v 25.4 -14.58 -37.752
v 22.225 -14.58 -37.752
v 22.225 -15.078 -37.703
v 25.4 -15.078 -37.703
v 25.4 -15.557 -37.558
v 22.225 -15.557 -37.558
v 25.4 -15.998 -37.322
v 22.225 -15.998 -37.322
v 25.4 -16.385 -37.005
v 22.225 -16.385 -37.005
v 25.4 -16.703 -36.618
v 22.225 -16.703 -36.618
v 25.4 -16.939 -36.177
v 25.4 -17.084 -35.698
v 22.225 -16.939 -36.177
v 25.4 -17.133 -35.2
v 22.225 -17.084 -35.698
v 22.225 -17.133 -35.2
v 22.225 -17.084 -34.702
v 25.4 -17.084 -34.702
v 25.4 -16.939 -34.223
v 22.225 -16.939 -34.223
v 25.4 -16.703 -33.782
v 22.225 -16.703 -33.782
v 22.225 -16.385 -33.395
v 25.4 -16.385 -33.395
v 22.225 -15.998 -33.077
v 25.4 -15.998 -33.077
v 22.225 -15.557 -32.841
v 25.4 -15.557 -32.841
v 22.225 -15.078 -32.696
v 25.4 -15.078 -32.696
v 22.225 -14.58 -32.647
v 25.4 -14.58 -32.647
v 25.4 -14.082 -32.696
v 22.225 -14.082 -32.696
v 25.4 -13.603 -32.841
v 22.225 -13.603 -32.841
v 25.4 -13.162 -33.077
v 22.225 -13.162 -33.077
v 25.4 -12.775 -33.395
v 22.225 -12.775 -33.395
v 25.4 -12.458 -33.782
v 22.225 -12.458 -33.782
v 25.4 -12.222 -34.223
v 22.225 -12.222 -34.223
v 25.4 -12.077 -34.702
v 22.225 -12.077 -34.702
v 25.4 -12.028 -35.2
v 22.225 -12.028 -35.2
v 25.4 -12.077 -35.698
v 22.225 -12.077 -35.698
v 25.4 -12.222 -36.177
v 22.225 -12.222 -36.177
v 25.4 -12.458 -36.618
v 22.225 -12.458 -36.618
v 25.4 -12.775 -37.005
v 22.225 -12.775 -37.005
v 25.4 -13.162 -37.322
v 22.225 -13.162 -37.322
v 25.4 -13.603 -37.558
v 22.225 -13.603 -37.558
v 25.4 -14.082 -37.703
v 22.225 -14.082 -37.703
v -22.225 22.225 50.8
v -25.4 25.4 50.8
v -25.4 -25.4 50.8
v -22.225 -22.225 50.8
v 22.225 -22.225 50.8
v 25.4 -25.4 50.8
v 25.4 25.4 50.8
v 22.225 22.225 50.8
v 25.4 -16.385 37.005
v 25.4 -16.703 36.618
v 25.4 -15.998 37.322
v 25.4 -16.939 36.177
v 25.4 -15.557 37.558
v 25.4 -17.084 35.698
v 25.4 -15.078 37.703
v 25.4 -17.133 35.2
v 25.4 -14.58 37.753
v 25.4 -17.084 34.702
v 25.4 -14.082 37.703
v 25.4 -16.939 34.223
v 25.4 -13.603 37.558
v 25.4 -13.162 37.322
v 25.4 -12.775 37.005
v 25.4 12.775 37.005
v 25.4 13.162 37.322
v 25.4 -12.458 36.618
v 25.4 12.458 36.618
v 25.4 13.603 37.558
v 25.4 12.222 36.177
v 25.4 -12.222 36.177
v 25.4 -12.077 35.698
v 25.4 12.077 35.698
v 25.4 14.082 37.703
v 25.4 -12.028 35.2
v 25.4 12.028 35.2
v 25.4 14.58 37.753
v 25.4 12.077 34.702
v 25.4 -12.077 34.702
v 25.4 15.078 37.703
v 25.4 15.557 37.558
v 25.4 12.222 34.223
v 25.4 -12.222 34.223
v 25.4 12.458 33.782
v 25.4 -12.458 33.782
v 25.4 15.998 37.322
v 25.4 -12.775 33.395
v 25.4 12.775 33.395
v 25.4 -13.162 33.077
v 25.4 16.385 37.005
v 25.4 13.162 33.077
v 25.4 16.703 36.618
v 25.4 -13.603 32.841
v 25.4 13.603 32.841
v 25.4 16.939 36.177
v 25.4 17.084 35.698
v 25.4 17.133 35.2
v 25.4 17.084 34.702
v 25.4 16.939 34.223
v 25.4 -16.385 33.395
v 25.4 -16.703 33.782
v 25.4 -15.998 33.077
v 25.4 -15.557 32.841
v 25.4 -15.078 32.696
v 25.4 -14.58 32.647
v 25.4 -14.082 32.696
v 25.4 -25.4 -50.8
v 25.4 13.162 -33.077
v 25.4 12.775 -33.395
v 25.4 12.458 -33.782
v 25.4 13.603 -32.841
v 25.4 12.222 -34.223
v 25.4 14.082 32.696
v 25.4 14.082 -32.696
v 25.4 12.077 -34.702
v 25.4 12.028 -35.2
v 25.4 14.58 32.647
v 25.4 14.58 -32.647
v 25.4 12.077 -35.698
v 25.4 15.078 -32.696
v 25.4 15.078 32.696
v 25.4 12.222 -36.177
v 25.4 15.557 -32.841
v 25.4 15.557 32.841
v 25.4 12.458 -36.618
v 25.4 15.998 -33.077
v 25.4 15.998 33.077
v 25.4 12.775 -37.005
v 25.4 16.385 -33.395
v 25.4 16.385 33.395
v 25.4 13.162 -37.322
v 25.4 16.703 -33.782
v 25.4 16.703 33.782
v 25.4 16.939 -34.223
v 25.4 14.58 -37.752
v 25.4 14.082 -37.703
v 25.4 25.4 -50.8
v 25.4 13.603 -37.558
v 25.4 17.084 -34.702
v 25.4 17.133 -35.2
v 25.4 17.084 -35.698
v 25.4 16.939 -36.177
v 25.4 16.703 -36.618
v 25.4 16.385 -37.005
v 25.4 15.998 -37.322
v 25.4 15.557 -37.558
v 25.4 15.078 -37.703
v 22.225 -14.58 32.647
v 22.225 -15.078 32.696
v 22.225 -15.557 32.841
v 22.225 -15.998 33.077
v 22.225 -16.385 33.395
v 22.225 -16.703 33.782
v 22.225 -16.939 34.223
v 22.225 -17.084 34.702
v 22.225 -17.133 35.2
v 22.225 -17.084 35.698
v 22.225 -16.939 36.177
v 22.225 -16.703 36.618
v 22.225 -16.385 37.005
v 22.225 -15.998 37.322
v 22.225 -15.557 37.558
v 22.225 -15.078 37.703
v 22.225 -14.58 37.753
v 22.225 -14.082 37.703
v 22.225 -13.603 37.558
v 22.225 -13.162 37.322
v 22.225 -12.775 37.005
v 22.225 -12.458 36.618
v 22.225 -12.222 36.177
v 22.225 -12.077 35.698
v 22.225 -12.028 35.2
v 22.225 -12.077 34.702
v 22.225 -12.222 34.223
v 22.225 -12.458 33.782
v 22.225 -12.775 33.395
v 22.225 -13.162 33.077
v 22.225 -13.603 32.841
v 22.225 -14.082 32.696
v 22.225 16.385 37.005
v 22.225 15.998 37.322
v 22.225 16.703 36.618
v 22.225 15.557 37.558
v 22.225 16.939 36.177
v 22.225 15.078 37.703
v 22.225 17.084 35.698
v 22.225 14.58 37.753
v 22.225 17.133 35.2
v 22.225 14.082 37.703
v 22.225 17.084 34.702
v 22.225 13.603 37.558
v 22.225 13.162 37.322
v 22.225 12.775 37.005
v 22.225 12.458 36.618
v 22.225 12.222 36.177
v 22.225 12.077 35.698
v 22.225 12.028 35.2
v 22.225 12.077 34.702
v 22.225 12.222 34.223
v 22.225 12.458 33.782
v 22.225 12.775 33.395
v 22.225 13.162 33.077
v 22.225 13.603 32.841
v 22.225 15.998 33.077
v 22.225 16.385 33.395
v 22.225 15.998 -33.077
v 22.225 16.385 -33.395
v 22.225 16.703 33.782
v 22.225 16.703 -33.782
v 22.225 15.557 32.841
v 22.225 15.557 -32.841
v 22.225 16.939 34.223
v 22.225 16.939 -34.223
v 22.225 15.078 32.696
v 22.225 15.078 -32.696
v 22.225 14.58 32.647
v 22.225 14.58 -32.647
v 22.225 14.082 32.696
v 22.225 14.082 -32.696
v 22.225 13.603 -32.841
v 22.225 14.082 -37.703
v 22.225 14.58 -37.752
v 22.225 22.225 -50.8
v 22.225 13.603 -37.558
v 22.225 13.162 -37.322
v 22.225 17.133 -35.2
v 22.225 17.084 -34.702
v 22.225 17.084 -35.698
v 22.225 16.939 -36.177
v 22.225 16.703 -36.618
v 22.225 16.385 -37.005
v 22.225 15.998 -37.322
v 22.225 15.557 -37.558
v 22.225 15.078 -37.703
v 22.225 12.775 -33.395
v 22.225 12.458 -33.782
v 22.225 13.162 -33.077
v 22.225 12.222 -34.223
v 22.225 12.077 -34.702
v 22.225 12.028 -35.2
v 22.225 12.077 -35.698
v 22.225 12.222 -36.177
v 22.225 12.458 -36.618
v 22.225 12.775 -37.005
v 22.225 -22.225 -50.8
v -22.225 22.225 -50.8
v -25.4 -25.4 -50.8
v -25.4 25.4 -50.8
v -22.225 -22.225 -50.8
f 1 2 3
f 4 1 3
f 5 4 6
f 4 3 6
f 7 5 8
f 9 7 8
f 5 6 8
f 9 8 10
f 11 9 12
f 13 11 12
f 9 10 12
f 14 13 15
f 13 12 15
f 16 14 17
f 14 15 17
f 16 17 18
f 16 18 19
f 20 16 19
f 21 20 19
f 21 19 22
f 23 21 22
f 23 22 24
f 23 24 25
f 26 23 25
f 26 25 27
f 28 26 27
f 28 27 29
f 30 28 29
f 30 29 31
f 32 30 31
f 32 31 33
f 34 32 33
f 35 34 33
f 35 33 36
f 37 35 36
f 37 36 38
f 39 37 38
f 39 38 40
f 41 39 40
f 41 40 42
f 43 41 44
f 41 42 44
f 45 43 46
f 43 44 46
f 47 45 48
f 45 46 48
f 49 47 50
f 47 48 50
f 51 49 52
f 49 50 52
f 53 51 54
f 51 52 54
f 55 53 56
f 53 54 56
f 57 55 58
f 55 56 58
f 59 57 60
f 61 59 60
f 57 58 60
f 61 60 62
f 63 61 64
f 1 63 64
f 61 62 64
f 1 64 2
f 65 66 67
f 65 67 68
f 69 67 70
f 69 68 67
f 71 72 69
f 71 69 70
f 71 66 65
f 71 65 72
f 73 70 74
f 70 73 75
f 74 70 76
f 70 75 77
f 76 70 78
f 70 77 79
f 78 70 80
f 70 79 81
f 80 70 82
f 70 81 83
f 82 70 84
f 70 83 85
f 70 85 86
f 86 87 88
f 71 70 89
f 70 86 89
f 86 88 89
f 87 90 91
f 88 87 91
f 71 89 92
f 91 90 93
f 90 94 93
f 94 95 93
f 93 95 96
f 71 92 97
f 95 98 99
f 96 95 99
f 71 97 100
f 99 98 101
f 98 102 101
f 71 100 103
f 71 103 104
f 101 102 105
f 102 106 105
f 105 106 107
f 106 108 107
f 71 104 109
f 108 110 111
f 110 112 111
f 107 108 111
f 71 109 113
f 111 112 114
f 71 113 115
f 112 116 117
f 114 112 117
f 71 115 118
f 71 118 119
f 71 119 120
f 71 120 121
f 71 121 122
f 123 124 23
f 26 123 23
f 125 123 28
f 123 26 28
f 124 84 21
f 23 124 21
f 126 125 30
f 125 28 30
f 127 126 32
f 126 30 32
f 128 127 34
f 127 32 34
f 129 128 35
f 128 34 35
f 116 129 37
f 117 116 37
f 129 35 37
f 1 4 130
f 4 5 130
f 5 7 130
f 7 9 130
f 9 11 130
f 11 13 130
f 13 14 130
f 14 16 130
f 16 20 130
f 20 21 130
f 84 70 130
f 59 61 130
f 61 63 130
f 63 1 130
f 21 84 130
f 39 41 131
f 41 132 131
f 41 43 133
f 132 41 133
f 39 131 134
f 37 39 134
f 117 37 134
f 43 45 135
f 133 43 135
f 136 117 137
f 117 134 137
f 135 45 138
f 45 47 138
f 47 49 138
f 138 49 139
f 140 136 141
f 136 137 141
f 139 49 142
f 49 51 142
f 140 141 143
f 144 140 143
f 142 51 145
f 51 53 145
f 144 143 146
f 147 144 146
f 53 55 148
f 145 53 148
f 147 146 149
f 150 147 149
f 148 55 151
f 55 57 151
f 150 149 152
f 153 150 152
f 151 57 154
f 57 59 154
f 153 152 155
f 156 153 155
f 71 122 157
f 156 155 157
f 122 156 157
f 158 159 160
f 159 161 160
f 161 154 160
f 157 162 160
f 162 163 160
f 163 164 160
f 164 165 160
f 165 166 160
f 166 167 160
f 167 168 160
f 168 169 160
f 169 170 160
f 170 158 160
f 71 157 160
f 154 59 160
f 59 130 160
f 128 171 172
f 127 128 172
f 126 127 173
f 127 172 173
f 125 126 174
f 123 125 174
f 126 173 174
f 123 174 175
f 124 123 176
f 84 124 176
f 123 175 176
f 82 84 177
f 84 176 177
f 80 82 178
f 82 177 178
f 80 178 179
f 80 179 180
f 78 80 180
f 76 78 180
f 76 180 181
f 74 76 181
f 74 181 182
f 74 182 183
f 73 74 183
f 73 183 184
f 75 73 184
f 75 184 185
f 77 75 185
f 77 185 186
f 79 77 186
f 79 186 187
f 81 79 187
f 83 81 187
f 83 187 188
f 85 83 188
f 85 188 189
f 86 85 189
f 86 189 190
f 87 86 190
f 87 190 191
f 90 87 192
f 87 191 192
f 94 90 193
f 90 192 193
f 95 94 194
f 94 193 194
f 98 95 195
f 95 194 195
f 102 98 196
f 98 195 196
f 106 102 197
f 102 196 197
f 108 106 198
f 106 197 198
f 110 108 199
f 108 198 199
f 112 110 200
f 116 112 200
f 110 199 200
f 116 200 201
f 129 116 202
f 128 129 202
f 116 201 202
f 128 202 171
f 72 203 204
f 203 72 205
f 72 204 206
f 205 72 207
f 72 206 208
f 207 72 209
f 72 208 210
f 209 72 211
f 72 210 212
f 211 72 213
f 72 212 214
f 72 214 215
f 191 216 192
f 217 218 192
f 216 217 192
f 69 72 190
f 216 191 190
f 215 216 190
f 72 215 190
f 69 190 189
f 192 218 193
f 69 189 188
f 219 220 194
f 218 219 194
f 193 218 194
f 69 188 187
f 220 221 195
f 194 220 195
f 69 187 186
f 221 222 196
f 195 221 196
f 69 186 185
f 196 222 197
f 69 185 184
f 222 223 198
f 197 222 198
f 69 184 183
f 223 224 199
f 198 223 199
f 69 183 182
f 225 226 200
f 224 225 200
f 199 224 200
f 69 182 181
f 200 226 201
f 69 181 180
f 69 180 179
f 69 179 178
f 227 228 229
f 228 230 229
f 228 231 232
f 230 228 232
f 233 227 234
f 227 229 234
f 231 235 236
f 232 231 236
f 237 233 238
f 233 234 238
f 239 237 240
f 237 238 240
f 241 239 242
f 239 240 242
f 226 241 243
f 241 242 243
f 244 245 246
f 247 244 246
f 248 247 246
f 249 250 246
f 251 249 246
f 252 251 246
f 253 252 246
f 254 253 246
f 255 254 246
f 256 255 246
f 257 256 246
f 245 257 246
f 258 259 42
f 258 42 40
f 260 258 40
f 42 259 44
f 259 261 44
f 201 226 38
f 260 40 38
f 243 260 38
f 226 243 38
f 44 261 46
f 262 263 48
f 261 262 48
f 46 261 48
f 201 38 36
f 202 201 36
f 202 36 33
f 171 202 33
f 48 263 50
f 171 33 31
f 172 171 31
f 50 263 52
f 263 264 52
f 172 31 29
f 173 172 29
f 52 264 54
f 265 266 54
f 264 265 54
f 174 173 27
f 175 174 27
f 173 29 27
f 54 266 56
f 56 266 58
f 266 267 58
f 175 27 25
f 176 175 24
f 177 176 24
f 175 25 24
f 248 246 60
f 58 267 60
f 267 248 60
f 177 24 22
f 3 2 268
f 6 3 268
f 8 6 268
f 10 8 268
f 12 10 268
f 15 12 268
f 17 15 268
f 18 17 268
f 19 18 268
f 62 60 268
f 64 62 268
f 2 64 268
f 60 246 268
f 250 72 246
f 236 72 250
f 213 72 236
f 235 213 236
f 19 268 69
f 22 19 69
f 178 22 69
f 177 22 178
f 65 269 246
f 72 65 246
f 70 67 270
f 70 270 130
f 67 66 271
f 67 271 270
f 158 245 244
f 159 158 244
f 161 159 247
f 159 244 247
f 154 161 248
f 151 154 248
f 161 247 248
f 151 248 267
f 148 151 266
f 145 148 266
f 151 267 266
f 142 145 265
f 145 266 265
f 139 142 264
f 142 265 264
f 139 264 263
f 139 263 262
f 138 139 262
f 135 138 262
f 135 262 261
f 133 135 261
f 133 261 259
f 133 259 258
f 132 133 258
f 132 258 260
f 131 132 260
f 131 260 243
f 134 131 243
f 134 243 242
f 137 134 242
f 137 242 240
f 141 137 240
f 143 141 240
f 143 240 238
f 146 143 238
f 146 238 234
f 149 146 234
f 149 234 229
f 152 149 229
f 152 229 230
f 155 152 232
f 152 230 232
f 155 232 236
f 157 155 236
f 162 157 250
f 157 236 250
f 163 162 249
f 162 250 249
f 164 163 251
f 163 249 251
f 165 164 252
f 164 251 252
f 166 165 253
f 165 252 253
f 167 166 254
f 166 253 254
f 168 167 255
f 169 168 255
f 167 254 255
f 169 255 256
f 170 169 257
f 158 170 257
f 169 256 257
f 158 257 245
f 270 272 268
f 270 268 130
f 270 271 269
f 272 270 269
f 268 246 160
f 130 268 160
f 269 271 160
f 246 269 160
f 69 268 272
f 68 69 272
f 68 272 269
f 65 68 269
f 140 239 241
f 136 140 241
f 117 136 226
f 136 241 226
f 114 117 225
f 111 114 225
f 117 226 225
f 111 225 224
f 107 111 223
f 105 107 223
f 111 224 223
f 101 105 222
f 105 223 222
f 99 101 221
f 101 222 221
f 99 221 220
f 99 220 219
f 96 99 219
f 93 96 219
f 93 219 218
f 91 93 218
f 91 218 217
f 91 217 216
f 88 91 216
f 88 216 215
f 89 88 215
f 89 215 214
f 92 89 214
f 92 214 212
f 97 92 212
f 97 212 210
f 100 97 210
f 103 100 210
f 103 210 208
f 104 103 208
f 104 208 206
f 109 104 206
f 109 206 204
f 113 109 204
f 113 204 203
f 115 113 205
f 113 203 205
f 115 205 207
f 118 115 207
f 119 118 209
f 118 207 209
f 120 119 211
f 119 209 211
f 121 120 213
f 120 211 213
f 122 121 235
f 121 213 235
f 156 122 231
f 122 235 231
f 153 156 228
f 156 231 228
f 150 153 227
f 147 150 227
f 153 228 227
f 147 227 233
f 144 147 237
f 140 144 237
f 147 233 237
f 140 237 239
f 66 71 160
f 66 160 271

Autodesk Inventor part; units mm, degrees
ref_plane "YZ Plane" through (0, 0, 0) normal (1, 0, 0) x (0, 1, 0)
ref_plane "XZ Plane" through (0, 0, 0) normal (0, 1, 0) x (-1, 0, 0)
ref_plane "XY Plane" through (0, 0, 0) normal (0, 0, 1) x (1, 0, 0)
sketch "Sketch1" plane through (0, 0, 0) normal (0, 0, 1) x (1, 0, 0)
  line L0 (-25.4, -25.4) -> (25.4, -25.4)
  line L1 (25.4, -25.4) -> (25.4, 25.4)
  line L2 (25.4, 25.4) -> (-25.4, 25.4)
  line L3 (-25.4, 25.4) -> (-25.4, -25.4)
  line L4 (-25.4, -25.4) -> (25.4, 25.4) construction
  line L5 (25.4, -25.4) -> (-25.4, 25.4) construction
  line L6 (-22.225, 22.225) -> (22.225, 22.225)
  line L7 (22.225, 22.225) -> (22.225, -22.225)
  line L8 (22.225, -22.225) -> (-22.225, -22.225)
  line L9 (-22.225, -22.225) -> (-22.225, 22.225)
  point P0 (0, 0)
  dimension "width" = 50.8
  dimension "height" = 50.8
  dimension "thickness" = 3.175
extrude "Extrusion1" add sketch "Sketch1" along normal mid plane 101.6
sketch "Sketch2" plane through (25.4, -25.4, 50.8) normal (1, 0, 0) x (0, 0, -1)
  line L0 (101.6, 50.8) -> (101.6, 0) construction
  line L1 (101.6, 0) -> (0, 0) construction
  line L2 (0, 0) -> (0, 50.8) construction
  line L3 (0, 50.8) -> (101.6, 50.8) construction
  circle A0 centre (50.8, 25.4) radius 38.1 construction
  line L4 (36.2198, 60.5998) -> (65.3802, 60.5998) construction
  point P0 (15.6002, 39.9802)
  point P1 (15.6002, 10.8198)
  point P2 (36.2198, -9.7998)
  point P3 (65.3802, -9.7998)
  point P4 (85.9998, 10.8198)
  point P5 (85.9998, 39.9802)
  dimension "d5" = 76.2
  dimension "d8" = 360
hole "Hole1" at (25.4, 35.1998, -14.5802) at (25.4, 35.1998, 14.5802) at (25.4, 14.5802, 35.1998) at (25.4, -14.5802, 35.1998) at (25.4, -35.1998, 14.5802) at (25.4, -35.1998, -14.5802) at (25.4, -14.5802, -35.1998) at (25.4, 14.5802, -35.1998) direction (-1, 0, 0) diameter 5.1054 depth 3.175 clearance for "Flat Head Machine Screw (82)" size "#10" standard "Ansi Unified Screw Threads"
properties part number "EL2-A-007" material "Aluminum 6061"
